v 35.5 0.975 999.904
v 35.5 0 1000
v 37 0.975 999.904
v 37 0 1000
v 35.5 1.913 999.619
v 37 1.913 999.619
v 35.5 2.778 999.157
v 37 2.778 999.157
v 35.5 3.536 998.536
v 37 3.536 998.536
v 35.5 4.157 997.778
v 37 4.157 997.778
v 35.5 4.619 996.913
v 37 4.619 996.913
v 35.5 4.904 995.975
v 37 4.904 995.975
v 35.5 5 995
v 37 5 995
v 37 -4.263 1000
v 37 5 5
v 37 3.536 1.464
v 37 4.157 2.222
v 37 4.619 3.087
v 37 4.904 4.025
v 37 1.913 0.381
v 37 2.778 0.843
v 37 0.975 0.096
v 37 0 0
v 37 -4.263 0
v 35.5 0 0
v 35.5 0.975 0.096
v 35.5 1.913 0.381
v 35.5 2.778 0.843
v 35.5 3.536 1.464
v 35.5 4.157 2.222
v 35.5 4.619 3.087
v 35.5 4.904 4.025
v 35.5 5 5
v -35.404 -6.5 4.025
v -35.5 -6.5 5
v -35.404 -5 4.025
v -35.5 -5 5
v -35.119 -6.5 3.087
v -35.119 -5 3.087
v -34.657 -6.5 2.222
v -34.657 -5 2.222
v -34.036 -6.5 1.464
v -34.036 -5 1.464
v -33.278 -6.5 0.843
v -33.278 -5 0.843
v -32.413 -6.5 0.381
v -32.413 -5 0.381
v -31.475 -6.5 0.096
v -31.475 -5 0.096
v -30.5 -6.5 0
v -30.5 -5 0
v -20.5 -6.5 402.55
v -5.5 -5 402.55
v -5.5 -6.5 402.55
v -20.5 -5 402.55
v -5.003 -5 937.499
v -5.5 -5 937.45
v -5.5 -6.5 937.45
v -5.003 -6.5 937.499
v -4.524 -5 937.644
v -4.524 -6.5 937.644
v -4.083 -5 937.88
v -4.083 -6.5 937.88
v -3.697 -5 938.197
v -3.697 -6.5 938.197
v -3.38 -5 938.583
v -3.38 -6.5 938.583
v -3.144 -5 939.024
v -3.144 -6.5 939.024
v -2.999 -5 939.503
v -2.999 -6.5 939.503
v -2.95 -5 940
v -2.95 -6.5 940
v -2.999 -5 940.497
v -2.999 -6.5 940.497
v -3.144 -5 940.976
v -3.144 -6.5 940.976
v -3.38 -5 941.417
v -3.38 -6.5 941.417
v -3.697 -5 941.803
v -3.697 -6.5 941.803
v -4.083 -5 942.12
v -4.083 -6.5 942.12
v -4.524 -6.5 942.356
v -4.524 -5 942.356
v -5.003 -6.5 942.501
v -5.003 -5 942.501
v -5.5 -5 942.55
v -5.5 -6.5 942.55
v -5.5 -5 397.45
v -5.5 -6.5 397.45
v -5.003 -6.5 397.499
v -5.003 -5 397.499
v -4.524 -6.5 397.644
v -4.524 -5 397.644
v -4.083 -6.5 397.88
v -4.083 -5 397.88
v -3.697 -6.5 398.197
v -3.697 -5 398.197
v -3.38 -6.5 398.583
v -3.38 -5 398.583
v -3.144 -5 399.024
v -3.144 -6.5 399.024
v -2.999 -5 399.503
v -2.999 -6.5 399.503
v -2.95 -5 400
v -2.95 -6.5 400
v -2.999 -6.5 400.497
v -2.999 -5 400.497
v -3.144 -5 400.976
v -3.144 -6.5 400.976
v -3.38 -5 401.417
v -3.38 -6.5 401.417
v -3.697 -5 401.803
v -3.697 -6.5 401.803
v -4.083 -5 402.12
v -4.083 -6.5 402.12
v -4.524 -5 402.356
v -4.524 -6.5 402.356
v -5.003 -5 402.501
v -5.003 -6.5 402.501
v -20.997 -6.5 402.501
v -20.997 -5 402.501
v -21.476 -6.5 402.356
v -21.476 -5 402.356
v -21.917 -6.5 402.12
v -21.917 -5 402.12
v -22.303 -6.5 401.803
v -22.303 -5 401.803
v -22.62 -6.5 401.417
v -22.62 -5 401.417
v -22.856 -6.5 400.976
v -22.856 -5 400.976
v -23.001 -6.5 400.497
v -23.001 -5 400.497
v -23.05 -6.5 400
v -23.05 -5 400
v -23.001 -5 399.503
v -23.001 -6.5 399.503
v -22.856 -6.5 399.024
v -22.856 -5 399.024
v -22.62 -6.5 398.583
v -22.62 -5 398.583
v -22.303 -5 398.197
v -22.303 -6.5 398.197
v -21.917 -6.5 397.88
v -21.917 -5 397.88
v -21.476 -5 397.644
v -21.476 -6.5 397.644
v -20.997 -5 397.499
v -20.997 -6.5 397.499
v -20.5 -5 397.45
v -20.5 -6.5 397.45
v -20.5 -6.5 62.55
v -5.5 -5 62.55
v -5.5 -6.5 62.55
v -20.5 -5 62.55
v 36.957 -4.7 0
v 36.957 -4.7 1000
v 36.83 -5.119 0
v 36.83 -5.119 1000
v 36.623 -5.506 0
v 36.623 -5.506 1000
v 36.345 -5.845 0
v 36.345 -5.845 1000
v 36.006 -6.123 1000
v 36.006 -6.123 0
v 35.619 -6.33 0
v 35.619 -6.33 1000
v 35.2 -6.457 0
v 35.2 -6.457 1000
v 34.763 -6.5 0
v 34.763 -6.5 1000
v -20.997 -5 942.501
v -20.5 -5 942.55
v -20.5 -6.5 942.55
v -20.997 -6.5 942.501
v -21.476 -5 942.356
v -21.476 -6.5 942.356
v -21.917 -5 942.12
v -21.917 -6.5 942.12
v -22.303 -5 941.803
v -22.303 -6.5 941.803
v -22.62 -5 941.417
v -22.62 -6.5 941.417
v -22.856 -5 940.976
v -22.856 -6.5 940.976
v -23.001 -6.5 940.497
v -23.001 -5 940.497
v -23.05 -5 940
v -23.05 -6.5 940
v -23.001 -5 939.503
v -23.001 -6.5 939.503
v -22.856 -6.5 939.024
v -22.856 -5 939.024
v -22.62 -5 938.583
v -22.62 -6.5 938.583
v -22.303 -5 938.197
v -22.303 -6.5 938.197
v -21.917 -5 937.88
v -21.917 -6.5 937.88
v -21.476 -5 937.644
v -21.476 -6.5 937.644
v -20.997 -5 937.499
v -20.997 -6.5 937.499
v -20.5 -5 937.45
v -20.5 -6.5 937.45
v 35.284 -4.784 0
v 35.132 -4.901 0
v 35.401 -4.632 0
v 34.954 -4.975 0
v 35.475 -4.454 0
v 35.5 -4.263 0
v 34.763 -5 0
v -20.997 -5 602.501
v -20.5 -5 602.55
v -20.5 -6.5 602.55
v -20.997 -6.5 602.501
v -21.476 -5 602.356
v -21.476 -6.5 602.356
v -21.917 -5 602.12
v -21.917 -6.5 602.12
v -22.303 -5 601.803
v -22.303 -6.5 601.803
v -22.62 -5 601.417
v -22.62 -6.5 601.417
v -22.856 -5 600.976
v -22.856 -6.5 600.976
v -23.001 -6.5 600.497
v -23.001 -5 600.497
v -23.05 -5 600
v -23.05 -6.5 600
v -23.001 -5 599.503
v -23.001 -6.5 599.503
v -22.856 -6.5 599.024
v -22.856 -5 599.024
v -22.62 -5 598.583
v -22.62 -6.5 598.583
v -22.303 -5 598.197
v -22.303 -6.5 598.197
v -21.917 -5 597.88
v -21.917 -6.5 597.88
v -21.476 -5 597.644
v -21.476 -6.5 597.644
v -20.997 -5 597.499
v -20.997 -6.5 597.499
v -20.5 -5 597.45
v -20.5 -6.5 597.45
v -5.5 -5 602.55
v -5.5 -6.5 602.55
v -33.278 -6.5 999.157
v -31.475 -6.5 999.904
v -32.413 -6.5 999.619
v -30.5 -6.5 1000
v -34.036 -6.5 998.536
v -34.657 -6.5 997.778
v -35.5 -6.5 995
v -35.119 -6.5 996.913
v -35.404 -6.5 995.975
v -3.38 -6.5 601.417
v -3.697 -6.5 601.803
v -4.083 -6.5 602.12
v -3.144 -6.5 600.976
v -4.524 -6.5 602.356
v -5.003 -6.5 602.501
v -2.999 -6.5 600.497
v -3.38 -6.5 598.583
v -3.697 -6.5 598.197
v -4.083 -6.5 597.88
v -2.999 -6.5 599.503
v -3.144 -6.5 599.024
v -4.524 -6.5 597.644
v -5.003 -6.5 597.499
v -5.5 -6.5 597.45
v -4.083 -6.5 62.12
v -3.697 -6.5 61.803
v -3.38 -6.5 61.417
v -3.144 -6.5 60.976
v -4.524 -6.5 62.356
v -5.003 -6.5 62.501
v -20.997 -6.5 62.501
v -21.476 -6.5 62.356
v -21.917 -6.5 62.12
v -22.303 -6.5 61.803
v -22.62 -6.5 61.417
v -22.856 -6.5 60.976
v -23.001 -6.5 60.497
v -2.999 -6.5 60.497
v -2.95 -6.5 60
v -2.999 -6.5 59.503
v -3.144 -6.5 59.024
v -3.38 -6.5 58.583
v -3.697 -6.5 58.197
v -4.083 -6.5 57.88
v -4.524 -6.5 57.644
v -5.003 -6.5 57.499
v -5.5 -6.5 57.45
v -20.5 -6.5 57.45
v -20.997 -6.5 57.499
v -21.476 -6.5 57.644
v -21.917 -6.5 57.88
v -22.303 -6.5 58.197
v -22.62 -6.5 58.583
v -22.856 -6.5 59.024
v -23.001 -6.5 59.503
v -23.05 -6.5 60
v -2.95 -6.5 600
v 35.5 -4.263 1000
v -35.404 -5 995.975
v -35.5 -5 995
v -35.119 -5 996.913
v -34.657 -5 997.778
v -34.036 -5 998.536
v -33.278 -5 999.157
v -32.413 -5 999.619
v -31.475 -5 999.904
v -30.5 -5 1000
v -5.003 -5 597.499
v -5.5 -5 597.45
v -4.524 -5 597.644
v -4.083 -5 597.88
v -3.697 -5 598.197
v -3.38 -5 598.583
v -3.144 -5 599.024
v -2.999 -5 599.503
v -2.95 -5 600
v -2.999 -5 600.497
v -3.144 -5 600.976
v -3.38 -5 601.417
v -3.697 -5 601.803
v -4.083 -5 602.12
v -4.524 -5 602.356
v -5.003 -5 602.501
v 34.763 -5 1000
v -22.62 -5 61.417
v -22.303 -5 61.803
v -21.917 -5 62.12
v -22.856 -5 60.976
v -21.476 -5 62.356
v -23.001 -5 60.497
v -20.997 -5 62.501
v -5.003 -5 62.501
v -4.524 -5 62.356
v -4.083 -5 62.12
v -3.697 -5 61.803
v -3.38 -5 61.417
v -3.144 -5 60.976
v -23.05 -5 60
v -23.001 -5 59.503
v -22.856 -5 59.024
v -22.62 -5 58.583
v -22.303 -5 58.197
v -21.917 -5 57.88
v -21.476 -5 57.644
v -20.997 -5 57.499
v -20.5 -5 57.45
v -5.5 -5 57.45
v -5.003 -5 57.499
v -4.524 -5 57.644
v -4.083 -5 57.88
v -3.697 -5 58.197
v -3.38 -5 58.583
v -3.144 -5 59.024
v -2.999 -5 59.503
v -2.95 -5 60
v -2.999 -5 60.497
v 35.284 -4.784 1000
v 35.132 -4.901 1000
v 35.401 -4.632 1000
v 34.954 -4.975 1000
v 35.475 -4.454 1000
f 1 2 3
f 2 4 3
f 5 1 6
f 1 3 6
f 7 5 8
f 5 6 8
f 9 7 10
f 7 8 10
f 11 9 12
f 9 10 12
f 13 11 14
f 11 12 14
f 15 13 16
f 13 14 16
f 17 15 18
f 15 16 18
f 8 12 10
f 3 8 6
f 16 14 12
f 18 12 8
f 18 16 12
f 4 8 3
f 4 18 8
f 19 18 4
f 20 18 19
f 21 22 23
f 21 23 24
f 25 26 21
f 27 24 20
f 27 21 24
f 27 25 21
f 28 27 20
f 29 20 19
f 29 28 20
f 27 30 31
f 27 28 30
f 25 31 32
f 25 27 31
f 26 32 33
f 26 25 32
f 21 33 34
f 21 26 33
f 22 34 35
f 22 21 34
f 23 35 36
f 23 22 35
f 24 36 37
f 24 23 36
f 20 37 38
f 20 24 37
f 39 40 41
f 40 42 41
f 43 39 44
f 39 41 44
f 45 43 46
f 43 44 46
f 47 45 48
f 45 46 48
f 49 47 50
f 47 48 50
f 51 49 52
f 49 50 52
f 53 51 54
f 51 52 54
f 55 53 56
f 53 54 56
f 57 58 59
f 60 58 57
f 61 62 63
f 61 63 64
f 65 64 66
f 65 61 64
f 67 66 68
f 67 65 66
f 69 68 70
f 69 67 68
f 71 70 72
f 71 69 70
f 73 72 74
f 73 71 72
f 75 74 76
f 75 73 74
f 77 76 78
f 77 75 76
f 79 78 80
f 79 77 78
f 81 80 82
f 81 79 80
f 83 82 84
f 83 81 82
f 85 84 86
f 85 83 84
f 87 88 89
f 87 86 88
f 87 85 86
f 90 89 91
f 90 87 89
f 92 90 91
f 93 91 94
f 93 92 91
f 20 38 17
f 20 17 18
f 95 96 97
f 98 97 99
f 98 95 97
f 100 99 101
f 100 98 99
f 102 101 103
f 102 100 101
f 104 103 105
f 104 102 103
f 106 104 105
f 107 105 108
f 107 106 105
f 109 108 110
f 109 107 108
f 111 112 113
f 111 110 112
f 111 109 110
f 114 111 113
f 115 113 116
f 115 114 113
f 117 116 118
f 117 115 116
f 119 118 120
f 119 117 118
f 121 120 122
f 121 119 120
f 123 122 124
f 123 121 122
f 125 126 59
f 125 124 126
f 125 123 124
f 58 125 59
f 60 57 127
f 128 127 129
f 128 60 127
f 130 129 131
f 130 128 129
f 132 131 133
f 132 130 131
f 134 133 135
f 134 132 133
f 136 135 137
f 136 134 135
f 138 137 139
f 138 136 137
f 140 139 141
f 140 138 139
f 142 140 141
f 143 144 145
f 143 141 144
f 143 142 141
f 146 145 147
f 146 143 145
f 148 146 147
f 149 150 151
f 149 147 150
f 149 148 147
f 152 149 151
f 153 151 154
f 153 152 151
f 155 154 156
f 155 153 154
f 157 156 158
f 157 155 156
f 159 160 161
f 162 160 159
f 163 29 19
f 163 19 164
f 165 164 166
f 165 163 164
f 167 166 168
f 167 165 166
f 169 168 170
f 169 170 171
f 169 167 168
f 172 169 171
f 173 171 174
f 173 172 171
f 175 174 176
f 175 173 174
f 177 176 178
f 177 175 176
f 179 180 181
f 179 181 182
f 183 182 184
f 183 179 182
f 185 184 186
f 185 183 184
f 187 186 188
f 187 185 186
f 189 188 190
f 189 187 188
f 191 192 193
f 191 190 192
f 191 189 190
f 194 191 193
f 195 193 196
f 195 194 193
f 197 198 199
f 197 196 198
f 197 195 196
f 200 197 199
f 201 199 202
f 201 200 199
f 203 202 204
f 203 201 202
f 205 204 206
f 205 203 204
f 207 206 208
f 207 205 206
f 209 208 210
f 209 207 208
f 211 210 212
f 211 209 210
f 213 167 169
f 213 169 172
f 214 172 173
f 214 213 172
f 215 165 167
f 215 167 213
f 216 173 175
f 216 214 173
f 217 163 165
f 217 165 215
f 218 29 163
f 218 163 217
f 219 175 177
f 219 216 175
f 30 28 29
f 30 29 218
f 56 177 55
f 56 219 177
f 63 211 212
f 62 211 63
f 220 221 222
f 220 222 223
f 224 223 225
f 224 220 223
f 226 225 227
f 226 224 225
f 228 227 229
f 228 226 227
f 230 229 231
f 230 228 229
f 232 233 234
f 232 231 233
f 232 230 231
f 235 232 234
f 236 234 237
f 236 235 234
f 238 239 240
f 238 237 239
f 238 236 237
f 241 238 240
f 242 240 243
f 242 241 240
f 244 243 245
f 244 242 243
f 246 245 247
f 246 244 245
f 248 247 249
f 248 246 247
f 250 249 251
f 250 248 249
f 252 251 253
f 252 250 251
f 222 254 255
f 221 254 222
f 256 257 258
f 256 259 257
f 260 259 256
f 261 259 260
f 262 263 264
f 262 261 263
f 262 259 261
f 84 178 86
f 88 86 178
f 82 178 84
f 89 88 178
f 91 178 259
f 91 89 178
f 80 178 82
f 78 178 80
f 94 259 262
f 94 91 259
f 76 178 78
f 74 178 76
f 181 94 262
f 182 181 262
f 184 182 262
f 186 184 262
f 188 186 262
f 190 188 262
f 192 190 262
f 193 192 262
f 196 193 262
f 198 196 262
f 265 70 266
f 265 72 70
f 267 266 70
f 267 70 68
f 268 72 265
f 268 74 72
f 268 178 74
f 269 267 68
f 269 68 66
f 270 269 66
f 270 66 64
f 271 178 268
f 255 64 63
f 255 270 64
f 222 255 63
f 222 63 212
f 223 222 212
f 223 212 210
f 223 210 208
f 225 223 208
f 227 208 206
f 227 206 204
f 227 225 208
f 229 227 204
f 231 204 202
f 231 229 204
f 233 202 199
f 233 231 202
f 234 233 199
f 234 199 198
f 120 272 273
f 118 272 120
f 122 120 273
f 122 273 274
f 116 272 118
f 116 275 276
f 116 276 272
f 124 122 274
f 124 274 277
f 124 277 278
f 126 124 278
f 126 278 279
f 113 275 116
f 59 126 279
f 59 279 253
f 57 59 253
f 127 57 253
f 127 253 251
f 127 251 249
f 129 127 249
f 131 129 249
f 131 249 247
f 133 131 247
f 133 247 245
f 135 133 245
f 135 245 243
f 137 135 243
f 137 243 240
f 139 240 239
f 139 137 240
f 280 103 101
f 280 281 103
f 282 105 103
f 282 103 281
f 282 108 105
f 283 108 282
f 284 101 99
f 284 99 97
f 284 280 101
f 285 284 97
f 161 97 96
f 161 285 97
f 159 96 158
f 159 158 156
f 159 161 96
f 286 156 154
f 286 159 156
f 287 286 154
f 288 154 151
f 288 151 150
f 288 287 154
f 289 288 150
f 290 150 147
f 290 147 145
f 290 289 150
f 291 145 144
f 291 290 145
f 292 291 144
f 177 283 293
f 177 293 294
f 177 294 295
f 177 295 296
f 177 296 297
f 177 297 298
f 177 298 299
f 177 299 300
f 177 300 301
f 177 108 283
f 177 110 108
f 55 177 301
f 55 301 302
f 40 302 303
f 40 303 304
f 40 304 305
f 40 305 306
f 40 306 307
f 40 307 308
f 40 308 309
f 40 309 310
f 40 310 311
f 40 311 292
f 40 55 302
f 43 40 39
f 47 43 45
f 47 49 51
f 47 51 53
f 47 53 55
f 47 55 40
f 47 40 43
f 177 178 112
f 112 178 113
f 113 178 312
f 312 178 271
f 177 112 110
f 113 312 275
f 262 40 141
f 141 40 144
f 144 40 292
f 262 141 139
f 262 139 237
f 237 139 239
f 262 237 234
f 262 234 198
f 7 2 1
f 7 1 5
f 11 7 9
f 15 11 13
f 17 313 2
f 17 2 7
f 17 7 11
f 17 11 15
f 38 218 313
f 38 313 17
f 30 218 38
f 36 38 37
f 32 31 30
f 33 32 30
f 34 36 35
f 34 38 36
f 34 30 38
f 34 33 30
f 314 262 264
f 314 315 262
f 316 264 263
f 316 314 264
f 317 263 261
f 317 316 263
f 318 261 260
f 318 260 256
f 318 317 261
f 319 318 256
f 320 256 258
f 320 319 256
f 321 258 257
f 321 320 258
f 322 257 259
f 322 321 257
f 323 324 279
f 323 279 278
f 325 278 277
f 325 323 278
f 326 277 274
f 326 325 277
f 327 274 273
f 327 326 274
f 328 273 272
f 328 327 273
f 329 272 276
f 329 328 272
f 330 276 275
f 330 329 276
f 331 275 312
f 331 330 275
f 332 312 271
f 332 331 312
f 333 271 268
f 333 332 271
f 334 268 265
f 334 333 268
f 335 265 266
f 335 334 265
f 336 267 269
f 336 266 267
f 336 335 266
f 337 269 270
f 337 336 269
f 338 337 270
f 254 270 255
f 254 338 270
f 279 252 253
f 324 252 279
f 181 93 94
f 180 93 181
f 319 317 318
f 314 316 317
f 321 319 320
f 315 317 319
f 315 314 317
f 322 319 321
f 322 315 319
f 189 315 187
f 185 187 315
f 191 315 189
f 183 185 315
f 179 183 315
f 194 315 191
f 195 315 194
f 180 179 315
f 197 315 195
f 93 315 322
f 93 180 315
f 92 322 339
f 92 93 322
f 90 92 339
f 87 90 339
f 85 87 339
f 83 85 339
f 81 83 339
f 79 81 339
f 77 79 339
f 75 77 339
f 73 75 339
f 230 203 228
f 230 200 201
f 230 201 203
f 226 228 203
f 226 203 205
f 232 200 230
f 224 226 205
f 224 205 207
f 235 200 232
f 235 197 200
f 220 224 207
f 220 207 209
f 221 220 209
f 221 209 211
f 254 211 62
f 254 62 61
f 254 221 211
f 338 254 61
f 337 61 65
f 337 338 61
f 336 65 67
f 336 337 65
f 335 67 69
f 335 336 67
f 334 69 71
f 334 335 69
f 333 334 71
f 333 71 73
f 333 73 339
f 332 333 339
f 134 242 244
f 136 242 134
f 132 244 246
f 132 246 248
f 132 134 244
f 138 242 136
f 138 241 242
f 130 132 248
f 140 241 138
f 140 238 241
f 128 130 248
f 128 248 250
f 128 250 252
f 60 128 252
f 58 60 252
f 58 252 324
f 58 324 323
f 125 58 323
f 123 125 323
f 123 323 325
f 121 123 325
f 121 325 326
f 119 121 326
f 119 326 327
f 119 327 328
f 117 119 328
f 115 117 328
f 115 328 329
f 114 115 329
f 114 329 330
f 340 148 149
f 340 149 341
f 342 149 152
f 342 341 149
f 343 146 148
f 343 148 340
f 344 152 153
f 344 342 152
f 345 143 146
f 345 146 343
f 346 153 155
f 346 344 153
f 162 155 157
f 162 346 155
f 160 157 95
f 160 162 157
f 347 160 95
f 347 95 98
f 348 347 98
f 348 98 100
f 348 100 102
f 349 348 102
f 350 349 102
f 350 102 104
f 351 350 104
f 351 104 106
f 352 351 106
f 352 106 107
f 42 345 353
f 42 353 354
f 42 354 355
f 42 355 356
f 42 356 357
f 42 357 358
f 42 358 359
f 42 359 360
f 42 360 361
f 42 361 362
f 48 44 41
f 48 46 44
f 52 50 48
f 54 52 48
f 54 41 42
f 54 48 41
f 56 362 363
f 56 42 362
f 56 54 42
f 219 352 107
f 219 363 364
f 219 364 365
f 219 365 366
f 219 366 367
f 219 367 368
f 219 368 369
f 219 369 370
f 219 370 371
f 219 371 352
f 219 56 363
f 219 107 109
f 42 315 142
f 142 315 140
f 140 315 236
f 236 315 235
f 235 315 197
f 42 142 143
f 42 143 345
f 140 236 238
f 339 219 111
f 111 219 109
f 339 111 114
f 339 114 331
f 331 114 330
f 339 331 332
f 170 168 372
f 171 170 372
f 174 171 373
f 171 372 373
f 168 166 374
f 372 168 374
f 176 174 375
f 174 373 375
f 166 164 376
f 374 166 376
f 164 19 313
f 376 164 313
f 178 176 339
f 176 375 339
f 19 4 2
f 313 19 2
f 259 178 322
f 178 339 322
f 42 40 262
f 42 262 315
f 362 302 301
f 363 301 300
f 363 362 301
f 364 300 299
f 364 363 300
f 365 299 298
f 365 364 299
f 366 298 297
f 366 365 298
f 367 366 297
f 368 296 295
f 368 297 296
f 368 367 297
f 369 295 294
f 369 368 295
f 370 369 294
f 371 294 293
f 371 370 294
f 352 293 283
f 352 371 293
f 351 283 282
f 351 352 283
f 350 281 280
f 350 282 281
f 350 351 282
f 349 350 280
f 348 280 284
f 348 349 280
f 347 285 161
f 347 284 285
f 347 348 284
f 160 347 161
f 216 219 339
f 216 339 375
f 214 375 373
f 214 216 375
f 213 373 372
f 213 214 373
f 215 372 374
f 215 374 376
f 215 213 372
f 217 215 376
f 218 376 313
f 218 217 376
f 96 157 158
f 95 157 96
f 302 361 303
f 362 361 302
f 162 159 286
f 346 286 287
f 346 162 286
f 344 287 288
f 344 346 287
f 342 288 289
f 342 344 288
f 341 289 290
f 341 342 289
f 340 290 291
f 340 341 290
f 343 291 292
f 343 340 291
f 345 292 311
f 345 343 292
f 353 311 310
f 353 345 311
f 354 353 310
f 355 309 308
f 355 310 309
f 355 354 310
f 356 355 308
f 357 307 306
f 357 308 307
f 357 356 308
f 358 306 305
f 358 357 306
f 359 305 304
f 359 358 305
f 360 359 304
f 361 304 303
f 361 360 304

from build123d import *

# Parameters (mm, degrees)
BASE_FLANGE1_DEPTH = 1000
CUT_EXTRUDE2_DEPTH = 1001.734230453
FILLET1_R          = 5


# Sheet-metal steps are written as plain solids
with BuildPart() as part:
    # Sketch1 → Base-Flange1 (new body)
    with BuildSketch(Plane.XY):
        with BuildLine():
            Line((-35.5, -5), (34.7634, -5))
            ThreePointArc((34.7634, -5), (35.284254855, -4.784254855), (35.5, -4.2634))
            Line((35.5, -4.2634), (35.5, 5))
            Line((35.5, 5), (37, 5))
            Line((37, 5), (37, -4.2634))
            ThreePointArc((37, -4.2634), (36.344915027, -5.844915027), (34.7634, -6.5))
            Line((34.7634, -6.5), (-35.5, -6.5))
            Line((-35.5, -6.5), (-35.5, -5))
        make_face()
    extrude(amount=BASE_FLANGE1_DEPTH)

    # Sketch4 → Cut-Extrude2 (cut, through all)
    with BuildSketch(Plane(origin=(0, -5, 0), x_dir=(1, 0, 0), z_dir=(0, 1, 0))):
        with BuildLine():
            ThreePointArc((-20.5, -62.55), (-23.05, -60), (-20.5, -57.45))
            Line((-20.5, -57.45), (-5.5, -57.45))
            ThreePointArc((-5.5, -57.45), (-2.95, -60), (-5.5, -62.55))
            Line((-5.5, -62.55), (-20.5, -62.55))
        make_face()
        with BuildLine():
            ThreePointArc((-20.5, -602.55), (-23.05, -600), (-20.5, -597.45))
            Line((-20.5, -597.45), (-5.5, -597.45))
            ThreePointArc((-5.5, -597.45), (-2.95, -600), (-5.5, -602.55))
            Line((-5.5, -602.55), (-20.5, -602.55))
        make_face()
        with BuildLine():
            ThreePointArc((-5.5, -937.45), (-2.95, -940), (-5.5, -942.55))
            Line((-5.5, -942.55), (-20.5, -942.55))
            ThreePointArc((-20.5, -942.55), (-23.05, -940), (-20.5, -937.45))
            Line((-20.5, -937.45), (-5.5, -937.45))
        make_face()
        with BuildLine():
            ThreePointArc((-5.5, -397.45), (-2.95, -400), (-5.5, -402.55))
            Line((-5.5, -402.55), (-20.5, -402.55))
            ThreePointArc((-20.5, -402.55), (-23.05, -400), (-20.5, -397.45))
            Line((-20.5, -397.45), (-5.5, -397.45))
        make_face()
    extrude(amount=-CUT_EXTRUDE2_DEPTH, mode=Mode.SUBTRACT)

    # Fillet1
    fillet1_edges = [part.edges().sort_by_distance(p)[0] for p in [
        (-35.5, -5.75, 1000),
        (36.25, 5, 1000),
        (-35.5, -5.75, 0),
        (36.25, 5, 0),
    ]]
    fillet(fillet1_edges, radius=FILLET1_R)


solid = part.part
